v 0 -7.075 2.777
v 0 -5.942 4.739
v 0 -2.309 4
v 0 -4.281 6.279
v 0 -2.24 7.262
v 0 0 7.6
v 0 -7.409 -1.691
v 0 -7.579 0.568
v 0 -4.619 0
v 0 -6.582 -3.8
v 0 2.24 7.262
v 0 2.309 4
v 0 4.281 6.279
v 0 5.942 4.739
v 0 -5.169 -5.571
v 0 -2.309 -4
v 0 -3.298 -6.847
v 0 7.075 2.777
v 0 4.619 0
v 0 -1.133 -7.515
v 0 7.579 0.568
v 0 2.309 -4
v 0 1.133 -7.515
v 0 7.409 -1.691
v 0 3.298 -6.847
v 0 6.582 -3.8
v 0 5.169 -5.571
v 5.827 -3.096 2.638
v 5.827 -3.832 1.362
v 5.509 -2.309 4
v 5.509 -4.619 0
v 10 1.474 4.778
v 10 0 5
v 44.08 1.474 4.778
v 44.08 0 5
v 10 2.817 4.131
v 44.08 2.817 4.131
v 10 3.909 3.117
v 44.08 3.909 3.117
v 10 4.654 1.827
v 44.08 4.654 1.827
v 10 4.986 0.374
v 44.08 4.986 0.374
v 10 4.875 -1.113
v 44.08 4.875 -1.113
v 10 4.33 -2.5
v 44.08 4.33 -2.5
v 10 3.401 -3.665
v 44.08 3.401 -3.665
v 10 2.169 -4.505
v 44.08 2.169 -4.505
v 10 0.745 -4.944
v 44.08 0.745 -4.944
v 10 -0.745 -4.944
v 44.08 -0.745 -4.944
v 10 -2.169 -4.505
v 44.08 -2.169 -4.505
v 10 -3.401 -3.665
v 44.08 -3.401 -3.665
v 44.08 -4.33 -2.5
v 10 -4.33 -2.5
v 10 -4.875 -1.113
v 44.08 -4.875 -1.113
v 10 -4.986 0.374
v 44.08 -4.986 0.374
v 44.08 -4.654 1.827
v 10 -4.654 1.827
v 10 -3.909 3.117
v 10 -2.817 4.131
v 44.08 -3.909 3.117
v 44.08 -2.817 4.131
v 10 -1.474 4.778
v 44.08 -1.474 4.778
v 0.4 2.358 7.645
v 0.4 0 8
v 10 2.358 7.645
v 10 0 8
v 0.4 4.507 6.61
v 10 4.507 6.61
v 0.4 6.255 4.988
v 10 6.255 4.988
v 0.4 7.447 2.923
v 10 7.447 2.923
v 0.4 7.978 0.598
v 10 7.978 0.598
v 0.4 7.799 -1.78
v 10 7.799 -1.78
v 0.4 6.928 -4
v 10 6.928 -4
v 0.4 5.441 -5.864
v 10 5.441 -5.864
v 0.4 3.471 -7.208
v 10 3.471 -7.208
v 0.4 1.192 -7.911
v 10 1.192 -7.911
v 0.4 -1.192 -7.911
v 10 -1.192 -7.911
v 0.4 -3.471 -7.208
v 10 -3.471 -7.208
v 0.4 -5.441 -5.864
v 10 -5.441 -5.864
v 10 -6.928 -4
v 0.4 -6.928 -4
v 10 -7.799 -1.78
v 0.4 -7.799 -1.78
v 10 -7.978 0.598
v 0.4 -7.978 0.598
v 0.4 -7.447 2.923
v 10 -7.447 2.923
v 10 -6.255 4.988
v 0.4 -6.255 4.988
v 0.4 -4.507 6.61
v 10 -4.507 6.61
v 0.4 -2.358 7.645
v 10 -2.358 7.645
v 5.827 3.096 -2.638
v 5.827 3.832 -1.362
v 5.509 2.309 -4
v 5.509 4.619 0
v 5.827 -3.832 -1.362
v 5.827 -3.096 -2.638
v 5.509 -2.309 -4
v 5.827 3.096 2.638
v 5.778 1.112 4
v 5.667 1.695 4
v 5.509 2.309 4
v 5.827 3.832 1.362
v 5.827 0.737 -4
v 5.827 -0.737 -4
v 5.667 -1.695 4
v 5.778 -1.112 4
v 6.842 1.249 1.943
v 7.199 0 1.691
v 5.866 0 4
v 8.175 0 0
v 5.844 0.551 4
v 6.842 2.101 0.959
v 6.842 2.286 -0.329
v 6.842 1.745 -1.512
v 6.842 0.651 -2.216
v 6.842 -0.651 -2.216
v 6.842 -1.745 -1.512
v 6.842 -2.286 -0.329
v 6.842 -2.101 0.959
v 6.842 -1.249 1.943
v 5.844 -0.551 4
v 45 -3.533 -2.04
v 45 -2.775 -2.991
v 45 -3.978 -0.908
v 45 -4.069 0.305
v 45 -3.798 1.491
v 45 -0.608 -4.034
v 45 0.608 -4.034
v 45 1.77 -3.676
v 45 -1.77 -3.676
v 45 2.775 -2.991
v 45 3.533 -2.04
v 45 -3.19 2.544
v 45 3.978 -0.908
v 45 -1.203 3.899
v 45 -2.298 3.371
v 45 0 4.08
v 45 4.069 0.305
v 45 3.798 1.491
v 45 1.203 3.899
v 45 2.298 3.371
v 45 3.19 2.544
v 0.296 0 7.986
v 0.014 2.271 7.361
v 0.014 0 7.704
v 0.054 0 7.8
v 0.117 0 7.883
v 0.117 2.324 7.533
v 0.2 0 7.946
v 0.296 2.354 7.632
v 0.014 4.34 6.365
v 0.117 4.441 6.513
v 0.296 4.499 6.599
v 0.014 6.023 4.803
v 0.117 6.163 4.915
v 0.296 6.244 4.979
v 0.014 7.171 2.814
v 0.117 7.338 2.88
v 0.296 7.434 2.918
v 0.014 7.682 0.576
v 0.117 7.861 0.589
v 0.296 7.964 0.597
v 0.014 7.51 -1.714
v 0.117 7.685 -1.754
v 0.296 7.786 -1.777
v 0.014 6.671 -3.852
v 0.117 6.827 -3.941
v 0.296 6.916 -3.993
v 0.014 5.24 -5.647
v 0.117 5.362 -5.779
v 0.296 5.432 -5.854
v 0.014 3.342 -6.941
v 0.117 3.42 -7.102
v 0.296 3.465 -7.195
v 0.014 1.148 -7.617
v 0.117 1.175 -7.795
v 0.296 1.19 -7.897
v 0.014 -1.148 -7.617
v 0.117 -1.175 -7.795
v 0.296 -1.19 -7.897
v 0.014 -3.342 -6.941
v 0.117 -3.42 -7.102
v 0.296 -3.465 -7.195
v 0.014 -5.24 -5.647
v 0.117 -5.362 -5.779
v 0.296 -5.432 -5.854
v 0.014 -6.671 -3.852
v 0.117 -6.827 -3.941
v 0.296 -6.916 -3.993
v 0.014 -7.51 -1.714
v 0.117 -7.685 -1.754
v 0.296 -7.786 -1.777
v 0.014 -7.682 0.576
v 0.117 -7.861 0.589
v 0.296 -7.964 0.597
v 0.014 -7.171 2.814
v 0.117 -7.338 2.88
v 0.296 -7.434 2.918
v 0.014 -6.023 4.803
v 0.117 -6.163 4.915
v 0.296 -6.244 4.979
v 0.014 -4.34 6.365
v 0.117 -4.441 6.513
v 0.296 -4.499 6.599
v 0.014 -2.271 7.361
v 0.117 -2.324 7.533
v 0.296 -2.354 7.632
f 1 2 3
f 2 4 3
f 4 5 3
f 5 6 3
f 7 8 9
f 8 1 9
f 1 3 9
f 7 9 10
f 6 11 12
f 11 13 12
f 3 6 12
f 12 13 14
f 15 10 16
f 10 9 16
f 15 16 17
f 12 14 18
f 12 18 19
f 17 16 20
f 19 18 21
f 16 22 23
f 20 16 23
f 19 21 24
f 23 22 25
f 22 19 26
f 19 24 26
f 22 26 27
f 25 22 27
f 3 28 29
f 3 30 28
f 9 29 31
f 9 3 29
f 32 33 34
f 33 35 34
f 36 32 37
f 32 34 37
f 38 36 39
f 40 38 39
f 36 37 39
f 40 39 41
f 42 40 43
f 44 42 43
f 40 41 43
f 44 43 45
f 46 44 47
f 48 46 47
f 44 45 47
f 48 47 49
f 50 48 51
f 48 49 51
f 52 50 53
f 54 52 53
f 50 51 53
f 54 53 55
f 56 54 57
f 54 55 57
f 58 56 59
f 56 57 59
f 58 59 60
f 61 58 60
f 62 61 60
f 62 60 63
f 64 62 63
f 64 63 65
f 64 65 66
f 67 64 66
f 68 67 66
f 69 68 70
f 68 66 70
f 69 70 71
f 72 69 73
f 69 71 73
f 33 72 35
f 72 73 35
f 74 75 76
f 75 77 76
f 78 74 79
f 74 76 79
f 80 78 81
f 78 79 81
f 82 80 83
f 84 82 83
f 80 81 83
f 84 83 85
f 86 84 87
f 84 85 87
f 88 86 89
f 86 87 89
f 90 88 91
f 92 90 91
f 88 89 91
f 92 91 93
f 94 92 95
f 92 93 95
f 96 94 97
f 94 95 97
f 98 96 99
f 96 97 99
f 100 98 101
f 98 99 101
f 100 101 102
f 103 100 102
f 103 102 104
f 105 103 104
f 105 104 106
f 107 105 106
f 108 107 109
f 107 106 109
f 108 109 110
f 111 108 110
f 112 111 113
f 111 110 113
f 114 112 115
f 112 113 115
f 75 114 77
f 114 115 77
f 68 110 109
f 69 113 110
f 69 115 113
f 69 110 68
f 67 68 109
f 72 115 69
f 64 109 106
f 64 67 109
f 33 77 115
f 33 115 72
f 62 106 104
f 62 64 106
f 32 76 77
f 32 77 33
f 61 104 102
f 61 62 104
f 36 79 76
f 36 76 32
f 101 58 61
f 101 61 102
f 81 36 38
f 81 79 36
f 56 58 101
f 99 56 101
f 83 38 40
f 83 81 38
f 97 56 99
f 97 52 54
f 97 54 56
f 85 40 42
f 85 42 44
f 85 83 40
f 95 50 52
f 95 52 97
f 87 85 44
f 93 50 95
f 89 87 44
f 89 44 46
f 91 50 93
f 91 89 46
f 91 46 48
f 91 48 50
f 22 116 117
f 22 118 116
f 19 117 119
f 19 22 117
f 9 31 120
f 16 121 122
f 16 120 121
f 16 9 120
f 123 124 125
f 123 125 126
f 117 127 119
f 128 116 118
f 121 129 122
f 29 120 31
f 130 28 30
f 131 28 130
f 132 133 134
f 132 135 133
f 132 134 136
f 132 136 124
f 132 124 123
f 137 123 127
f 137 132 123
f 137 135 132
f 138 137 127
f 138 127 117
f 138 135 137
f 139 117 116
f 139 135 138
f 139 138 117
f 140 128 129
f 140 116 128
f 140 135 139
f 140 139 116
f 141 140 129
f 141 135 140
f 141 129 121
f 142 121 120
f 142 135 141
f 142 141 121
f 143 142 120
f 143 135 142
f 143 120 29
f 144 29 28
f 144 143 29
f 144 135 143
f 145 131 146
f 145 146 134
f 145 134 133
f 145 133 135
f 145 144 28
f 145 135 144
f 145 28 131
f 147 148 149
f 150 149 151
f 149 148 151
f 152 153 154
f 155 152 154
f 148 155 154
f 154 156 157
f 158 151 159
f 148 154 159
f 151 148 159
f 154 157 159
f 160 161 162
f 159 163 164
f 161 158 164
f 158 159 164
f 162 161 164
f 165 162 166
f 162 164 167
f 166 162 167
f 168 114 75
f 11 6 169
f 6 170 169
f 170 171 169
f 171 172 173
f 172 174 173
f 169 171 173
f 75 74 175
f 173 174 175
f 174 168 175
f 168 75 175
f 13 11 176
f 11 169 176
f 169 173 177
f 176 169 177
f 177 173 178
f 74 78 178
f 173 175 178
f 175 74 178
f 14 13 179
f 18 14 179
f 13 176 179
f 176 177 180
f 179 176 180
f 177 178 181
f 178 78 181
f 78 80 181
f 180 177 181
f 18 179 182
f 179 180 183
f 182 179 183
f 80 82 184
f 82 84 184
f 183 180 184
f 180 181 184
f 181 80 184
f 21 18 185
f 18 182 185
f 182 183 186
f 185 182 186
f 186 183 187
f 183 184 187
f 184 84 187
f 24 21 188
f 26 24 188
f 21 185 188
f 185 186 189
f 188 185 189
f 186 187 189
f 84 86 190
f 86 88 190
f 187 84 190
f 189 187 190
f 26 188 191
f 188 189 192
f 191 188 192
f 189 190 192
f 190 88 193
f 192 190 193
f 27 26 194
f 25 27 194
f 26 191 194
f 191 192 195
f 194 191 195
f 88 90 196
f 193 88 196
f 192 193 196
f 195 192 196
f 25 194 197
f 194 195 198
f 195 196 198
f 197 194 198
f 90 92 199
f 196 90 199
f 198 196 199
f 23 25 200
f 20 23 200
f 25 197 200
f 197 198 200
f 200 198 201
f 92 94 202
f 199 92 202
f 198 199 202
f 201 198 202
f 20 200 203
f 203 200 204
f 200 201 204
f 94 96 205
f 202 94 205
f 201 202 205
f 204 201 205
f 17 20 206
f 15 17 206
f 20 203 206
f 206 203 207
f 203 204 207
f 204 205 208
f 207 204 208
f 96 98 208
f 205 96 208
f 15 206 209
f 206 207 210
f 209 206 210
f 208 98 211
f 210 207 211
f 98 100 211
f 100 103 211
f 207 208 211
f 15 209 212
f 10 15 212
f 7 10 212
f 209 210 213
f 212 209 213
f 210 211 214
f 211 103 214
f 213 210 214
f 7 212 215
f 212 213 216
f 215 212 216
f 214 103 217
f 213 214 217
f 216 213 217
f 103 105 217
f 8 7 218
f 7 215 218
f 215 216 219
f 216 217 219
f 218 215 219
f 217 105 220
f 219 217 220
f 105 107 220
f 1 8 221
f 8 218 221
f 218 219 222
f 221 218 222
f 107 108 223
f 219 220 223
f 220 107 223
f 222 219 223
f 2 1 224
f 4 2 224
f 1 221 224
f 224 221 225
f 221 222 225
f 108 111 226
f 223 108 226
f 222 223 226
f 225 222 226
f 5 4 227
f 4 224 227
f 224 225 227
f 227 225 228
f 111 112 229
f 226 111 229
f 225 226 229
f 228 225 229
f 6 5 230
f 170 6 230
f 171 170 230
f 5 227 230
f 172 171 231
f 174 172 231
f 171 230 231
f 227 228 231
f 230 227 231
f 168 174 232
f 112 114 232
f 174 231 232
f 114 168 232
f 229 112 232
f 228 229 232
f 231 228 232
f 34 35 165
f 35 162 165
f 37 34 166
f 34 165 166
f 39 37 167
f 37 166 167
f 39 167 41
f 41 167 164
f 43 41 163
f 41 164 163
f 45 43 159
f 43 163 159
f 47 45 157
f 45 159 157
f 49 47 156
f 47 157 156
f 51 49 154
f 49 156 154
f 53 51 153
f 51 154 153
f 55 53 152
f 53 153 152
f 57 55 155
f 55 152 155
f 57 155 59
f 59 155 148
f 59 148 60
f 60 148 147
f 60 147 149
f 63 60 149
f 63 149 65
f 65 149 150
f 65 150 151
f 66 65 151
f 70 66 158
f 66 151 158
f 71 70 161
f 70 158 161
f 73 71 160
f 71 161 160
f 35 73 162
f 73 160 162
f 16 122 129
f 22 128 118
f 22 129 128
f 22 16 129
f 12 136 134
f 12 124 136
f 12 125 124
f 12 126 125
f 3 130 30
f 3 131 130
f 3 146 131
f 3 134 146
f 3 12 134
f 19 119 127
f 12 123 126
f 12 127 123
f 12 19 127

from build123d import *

# Parameters (mm, degrees)
SZKIC1_W                    = 10
SZKIC1_H                    = 8
SZKIC5_R                    = 6
DODANIE_WYCI_GNI_CIE1_DEPTH = 7.5


with BuildPart() as part:
    # Szkic1 → Obrót1 (revolve)
    with BuildSketch(Plane.XY):
        with Locations((5, 4)):
            Rectangle(SZKIC1_W, SZKIC1_H)
    revolve(axis=Axis((10, 0, 0), (-1, 0, 0)))

    # Szkic2 → Wycięcie-obrót1 (revolve, cut)
    with BuildSketch(Plane.XY):
        with BuildLine():
            Line((0, 8), (0, 7.6))
            ThreePointArc((0, 7.6), (0.117157288, 7.882842712), (0.4, 8))
            Line((0.4, 8), (0, 8))
        make_face()
    revolve(axis=Axis((10, 0, 0), (-1, 0, 0)), mode=Mode.SUBTRACT)

    # Szkic3 → Obrót2 (revolve)
    with BuildSketch(Plane.XY):
        Polygon((10, 0), (10, 5), (44.08, 5), (45, 4.08), (45, 0), align=None)
    revolve(axis=Axis((45, 0, 0), (-1, 0, 0)))

    # Szkic4 → Wycięcie-obrót2 (revolve, cut)
    with BuildSketch(Plane.XY):
        Polygon((0, 0), (0, 5.5), (5, 5.5), (8.175426481, 0), align=None)
    revolve(axis=Axis((8.175426481, 0, 0), (-1, 0, 0)), mode=Mode.SUBTRACT)

    # Szkic5 → Dodanie-wyciągnięcie1 (add)
    with BuildSketch(Plane(origin=(0, 0, 0), x_dir=(0, 0, -1), z_dir=(1, 0, 0))):
        Circle(SZKIC5_R)
        Polygon((-4, 2.309401077), (-4, -2.309401077), (0, -4.618802154), (4, -2.309401077), (4, 2.309401077), (0, 4.618802154), align=None, mode=Mode.SUBTRACT)
    extrude(amount=DODANIE_WYCI_GNI_CIE1_DEPTH)


solid = part.part
